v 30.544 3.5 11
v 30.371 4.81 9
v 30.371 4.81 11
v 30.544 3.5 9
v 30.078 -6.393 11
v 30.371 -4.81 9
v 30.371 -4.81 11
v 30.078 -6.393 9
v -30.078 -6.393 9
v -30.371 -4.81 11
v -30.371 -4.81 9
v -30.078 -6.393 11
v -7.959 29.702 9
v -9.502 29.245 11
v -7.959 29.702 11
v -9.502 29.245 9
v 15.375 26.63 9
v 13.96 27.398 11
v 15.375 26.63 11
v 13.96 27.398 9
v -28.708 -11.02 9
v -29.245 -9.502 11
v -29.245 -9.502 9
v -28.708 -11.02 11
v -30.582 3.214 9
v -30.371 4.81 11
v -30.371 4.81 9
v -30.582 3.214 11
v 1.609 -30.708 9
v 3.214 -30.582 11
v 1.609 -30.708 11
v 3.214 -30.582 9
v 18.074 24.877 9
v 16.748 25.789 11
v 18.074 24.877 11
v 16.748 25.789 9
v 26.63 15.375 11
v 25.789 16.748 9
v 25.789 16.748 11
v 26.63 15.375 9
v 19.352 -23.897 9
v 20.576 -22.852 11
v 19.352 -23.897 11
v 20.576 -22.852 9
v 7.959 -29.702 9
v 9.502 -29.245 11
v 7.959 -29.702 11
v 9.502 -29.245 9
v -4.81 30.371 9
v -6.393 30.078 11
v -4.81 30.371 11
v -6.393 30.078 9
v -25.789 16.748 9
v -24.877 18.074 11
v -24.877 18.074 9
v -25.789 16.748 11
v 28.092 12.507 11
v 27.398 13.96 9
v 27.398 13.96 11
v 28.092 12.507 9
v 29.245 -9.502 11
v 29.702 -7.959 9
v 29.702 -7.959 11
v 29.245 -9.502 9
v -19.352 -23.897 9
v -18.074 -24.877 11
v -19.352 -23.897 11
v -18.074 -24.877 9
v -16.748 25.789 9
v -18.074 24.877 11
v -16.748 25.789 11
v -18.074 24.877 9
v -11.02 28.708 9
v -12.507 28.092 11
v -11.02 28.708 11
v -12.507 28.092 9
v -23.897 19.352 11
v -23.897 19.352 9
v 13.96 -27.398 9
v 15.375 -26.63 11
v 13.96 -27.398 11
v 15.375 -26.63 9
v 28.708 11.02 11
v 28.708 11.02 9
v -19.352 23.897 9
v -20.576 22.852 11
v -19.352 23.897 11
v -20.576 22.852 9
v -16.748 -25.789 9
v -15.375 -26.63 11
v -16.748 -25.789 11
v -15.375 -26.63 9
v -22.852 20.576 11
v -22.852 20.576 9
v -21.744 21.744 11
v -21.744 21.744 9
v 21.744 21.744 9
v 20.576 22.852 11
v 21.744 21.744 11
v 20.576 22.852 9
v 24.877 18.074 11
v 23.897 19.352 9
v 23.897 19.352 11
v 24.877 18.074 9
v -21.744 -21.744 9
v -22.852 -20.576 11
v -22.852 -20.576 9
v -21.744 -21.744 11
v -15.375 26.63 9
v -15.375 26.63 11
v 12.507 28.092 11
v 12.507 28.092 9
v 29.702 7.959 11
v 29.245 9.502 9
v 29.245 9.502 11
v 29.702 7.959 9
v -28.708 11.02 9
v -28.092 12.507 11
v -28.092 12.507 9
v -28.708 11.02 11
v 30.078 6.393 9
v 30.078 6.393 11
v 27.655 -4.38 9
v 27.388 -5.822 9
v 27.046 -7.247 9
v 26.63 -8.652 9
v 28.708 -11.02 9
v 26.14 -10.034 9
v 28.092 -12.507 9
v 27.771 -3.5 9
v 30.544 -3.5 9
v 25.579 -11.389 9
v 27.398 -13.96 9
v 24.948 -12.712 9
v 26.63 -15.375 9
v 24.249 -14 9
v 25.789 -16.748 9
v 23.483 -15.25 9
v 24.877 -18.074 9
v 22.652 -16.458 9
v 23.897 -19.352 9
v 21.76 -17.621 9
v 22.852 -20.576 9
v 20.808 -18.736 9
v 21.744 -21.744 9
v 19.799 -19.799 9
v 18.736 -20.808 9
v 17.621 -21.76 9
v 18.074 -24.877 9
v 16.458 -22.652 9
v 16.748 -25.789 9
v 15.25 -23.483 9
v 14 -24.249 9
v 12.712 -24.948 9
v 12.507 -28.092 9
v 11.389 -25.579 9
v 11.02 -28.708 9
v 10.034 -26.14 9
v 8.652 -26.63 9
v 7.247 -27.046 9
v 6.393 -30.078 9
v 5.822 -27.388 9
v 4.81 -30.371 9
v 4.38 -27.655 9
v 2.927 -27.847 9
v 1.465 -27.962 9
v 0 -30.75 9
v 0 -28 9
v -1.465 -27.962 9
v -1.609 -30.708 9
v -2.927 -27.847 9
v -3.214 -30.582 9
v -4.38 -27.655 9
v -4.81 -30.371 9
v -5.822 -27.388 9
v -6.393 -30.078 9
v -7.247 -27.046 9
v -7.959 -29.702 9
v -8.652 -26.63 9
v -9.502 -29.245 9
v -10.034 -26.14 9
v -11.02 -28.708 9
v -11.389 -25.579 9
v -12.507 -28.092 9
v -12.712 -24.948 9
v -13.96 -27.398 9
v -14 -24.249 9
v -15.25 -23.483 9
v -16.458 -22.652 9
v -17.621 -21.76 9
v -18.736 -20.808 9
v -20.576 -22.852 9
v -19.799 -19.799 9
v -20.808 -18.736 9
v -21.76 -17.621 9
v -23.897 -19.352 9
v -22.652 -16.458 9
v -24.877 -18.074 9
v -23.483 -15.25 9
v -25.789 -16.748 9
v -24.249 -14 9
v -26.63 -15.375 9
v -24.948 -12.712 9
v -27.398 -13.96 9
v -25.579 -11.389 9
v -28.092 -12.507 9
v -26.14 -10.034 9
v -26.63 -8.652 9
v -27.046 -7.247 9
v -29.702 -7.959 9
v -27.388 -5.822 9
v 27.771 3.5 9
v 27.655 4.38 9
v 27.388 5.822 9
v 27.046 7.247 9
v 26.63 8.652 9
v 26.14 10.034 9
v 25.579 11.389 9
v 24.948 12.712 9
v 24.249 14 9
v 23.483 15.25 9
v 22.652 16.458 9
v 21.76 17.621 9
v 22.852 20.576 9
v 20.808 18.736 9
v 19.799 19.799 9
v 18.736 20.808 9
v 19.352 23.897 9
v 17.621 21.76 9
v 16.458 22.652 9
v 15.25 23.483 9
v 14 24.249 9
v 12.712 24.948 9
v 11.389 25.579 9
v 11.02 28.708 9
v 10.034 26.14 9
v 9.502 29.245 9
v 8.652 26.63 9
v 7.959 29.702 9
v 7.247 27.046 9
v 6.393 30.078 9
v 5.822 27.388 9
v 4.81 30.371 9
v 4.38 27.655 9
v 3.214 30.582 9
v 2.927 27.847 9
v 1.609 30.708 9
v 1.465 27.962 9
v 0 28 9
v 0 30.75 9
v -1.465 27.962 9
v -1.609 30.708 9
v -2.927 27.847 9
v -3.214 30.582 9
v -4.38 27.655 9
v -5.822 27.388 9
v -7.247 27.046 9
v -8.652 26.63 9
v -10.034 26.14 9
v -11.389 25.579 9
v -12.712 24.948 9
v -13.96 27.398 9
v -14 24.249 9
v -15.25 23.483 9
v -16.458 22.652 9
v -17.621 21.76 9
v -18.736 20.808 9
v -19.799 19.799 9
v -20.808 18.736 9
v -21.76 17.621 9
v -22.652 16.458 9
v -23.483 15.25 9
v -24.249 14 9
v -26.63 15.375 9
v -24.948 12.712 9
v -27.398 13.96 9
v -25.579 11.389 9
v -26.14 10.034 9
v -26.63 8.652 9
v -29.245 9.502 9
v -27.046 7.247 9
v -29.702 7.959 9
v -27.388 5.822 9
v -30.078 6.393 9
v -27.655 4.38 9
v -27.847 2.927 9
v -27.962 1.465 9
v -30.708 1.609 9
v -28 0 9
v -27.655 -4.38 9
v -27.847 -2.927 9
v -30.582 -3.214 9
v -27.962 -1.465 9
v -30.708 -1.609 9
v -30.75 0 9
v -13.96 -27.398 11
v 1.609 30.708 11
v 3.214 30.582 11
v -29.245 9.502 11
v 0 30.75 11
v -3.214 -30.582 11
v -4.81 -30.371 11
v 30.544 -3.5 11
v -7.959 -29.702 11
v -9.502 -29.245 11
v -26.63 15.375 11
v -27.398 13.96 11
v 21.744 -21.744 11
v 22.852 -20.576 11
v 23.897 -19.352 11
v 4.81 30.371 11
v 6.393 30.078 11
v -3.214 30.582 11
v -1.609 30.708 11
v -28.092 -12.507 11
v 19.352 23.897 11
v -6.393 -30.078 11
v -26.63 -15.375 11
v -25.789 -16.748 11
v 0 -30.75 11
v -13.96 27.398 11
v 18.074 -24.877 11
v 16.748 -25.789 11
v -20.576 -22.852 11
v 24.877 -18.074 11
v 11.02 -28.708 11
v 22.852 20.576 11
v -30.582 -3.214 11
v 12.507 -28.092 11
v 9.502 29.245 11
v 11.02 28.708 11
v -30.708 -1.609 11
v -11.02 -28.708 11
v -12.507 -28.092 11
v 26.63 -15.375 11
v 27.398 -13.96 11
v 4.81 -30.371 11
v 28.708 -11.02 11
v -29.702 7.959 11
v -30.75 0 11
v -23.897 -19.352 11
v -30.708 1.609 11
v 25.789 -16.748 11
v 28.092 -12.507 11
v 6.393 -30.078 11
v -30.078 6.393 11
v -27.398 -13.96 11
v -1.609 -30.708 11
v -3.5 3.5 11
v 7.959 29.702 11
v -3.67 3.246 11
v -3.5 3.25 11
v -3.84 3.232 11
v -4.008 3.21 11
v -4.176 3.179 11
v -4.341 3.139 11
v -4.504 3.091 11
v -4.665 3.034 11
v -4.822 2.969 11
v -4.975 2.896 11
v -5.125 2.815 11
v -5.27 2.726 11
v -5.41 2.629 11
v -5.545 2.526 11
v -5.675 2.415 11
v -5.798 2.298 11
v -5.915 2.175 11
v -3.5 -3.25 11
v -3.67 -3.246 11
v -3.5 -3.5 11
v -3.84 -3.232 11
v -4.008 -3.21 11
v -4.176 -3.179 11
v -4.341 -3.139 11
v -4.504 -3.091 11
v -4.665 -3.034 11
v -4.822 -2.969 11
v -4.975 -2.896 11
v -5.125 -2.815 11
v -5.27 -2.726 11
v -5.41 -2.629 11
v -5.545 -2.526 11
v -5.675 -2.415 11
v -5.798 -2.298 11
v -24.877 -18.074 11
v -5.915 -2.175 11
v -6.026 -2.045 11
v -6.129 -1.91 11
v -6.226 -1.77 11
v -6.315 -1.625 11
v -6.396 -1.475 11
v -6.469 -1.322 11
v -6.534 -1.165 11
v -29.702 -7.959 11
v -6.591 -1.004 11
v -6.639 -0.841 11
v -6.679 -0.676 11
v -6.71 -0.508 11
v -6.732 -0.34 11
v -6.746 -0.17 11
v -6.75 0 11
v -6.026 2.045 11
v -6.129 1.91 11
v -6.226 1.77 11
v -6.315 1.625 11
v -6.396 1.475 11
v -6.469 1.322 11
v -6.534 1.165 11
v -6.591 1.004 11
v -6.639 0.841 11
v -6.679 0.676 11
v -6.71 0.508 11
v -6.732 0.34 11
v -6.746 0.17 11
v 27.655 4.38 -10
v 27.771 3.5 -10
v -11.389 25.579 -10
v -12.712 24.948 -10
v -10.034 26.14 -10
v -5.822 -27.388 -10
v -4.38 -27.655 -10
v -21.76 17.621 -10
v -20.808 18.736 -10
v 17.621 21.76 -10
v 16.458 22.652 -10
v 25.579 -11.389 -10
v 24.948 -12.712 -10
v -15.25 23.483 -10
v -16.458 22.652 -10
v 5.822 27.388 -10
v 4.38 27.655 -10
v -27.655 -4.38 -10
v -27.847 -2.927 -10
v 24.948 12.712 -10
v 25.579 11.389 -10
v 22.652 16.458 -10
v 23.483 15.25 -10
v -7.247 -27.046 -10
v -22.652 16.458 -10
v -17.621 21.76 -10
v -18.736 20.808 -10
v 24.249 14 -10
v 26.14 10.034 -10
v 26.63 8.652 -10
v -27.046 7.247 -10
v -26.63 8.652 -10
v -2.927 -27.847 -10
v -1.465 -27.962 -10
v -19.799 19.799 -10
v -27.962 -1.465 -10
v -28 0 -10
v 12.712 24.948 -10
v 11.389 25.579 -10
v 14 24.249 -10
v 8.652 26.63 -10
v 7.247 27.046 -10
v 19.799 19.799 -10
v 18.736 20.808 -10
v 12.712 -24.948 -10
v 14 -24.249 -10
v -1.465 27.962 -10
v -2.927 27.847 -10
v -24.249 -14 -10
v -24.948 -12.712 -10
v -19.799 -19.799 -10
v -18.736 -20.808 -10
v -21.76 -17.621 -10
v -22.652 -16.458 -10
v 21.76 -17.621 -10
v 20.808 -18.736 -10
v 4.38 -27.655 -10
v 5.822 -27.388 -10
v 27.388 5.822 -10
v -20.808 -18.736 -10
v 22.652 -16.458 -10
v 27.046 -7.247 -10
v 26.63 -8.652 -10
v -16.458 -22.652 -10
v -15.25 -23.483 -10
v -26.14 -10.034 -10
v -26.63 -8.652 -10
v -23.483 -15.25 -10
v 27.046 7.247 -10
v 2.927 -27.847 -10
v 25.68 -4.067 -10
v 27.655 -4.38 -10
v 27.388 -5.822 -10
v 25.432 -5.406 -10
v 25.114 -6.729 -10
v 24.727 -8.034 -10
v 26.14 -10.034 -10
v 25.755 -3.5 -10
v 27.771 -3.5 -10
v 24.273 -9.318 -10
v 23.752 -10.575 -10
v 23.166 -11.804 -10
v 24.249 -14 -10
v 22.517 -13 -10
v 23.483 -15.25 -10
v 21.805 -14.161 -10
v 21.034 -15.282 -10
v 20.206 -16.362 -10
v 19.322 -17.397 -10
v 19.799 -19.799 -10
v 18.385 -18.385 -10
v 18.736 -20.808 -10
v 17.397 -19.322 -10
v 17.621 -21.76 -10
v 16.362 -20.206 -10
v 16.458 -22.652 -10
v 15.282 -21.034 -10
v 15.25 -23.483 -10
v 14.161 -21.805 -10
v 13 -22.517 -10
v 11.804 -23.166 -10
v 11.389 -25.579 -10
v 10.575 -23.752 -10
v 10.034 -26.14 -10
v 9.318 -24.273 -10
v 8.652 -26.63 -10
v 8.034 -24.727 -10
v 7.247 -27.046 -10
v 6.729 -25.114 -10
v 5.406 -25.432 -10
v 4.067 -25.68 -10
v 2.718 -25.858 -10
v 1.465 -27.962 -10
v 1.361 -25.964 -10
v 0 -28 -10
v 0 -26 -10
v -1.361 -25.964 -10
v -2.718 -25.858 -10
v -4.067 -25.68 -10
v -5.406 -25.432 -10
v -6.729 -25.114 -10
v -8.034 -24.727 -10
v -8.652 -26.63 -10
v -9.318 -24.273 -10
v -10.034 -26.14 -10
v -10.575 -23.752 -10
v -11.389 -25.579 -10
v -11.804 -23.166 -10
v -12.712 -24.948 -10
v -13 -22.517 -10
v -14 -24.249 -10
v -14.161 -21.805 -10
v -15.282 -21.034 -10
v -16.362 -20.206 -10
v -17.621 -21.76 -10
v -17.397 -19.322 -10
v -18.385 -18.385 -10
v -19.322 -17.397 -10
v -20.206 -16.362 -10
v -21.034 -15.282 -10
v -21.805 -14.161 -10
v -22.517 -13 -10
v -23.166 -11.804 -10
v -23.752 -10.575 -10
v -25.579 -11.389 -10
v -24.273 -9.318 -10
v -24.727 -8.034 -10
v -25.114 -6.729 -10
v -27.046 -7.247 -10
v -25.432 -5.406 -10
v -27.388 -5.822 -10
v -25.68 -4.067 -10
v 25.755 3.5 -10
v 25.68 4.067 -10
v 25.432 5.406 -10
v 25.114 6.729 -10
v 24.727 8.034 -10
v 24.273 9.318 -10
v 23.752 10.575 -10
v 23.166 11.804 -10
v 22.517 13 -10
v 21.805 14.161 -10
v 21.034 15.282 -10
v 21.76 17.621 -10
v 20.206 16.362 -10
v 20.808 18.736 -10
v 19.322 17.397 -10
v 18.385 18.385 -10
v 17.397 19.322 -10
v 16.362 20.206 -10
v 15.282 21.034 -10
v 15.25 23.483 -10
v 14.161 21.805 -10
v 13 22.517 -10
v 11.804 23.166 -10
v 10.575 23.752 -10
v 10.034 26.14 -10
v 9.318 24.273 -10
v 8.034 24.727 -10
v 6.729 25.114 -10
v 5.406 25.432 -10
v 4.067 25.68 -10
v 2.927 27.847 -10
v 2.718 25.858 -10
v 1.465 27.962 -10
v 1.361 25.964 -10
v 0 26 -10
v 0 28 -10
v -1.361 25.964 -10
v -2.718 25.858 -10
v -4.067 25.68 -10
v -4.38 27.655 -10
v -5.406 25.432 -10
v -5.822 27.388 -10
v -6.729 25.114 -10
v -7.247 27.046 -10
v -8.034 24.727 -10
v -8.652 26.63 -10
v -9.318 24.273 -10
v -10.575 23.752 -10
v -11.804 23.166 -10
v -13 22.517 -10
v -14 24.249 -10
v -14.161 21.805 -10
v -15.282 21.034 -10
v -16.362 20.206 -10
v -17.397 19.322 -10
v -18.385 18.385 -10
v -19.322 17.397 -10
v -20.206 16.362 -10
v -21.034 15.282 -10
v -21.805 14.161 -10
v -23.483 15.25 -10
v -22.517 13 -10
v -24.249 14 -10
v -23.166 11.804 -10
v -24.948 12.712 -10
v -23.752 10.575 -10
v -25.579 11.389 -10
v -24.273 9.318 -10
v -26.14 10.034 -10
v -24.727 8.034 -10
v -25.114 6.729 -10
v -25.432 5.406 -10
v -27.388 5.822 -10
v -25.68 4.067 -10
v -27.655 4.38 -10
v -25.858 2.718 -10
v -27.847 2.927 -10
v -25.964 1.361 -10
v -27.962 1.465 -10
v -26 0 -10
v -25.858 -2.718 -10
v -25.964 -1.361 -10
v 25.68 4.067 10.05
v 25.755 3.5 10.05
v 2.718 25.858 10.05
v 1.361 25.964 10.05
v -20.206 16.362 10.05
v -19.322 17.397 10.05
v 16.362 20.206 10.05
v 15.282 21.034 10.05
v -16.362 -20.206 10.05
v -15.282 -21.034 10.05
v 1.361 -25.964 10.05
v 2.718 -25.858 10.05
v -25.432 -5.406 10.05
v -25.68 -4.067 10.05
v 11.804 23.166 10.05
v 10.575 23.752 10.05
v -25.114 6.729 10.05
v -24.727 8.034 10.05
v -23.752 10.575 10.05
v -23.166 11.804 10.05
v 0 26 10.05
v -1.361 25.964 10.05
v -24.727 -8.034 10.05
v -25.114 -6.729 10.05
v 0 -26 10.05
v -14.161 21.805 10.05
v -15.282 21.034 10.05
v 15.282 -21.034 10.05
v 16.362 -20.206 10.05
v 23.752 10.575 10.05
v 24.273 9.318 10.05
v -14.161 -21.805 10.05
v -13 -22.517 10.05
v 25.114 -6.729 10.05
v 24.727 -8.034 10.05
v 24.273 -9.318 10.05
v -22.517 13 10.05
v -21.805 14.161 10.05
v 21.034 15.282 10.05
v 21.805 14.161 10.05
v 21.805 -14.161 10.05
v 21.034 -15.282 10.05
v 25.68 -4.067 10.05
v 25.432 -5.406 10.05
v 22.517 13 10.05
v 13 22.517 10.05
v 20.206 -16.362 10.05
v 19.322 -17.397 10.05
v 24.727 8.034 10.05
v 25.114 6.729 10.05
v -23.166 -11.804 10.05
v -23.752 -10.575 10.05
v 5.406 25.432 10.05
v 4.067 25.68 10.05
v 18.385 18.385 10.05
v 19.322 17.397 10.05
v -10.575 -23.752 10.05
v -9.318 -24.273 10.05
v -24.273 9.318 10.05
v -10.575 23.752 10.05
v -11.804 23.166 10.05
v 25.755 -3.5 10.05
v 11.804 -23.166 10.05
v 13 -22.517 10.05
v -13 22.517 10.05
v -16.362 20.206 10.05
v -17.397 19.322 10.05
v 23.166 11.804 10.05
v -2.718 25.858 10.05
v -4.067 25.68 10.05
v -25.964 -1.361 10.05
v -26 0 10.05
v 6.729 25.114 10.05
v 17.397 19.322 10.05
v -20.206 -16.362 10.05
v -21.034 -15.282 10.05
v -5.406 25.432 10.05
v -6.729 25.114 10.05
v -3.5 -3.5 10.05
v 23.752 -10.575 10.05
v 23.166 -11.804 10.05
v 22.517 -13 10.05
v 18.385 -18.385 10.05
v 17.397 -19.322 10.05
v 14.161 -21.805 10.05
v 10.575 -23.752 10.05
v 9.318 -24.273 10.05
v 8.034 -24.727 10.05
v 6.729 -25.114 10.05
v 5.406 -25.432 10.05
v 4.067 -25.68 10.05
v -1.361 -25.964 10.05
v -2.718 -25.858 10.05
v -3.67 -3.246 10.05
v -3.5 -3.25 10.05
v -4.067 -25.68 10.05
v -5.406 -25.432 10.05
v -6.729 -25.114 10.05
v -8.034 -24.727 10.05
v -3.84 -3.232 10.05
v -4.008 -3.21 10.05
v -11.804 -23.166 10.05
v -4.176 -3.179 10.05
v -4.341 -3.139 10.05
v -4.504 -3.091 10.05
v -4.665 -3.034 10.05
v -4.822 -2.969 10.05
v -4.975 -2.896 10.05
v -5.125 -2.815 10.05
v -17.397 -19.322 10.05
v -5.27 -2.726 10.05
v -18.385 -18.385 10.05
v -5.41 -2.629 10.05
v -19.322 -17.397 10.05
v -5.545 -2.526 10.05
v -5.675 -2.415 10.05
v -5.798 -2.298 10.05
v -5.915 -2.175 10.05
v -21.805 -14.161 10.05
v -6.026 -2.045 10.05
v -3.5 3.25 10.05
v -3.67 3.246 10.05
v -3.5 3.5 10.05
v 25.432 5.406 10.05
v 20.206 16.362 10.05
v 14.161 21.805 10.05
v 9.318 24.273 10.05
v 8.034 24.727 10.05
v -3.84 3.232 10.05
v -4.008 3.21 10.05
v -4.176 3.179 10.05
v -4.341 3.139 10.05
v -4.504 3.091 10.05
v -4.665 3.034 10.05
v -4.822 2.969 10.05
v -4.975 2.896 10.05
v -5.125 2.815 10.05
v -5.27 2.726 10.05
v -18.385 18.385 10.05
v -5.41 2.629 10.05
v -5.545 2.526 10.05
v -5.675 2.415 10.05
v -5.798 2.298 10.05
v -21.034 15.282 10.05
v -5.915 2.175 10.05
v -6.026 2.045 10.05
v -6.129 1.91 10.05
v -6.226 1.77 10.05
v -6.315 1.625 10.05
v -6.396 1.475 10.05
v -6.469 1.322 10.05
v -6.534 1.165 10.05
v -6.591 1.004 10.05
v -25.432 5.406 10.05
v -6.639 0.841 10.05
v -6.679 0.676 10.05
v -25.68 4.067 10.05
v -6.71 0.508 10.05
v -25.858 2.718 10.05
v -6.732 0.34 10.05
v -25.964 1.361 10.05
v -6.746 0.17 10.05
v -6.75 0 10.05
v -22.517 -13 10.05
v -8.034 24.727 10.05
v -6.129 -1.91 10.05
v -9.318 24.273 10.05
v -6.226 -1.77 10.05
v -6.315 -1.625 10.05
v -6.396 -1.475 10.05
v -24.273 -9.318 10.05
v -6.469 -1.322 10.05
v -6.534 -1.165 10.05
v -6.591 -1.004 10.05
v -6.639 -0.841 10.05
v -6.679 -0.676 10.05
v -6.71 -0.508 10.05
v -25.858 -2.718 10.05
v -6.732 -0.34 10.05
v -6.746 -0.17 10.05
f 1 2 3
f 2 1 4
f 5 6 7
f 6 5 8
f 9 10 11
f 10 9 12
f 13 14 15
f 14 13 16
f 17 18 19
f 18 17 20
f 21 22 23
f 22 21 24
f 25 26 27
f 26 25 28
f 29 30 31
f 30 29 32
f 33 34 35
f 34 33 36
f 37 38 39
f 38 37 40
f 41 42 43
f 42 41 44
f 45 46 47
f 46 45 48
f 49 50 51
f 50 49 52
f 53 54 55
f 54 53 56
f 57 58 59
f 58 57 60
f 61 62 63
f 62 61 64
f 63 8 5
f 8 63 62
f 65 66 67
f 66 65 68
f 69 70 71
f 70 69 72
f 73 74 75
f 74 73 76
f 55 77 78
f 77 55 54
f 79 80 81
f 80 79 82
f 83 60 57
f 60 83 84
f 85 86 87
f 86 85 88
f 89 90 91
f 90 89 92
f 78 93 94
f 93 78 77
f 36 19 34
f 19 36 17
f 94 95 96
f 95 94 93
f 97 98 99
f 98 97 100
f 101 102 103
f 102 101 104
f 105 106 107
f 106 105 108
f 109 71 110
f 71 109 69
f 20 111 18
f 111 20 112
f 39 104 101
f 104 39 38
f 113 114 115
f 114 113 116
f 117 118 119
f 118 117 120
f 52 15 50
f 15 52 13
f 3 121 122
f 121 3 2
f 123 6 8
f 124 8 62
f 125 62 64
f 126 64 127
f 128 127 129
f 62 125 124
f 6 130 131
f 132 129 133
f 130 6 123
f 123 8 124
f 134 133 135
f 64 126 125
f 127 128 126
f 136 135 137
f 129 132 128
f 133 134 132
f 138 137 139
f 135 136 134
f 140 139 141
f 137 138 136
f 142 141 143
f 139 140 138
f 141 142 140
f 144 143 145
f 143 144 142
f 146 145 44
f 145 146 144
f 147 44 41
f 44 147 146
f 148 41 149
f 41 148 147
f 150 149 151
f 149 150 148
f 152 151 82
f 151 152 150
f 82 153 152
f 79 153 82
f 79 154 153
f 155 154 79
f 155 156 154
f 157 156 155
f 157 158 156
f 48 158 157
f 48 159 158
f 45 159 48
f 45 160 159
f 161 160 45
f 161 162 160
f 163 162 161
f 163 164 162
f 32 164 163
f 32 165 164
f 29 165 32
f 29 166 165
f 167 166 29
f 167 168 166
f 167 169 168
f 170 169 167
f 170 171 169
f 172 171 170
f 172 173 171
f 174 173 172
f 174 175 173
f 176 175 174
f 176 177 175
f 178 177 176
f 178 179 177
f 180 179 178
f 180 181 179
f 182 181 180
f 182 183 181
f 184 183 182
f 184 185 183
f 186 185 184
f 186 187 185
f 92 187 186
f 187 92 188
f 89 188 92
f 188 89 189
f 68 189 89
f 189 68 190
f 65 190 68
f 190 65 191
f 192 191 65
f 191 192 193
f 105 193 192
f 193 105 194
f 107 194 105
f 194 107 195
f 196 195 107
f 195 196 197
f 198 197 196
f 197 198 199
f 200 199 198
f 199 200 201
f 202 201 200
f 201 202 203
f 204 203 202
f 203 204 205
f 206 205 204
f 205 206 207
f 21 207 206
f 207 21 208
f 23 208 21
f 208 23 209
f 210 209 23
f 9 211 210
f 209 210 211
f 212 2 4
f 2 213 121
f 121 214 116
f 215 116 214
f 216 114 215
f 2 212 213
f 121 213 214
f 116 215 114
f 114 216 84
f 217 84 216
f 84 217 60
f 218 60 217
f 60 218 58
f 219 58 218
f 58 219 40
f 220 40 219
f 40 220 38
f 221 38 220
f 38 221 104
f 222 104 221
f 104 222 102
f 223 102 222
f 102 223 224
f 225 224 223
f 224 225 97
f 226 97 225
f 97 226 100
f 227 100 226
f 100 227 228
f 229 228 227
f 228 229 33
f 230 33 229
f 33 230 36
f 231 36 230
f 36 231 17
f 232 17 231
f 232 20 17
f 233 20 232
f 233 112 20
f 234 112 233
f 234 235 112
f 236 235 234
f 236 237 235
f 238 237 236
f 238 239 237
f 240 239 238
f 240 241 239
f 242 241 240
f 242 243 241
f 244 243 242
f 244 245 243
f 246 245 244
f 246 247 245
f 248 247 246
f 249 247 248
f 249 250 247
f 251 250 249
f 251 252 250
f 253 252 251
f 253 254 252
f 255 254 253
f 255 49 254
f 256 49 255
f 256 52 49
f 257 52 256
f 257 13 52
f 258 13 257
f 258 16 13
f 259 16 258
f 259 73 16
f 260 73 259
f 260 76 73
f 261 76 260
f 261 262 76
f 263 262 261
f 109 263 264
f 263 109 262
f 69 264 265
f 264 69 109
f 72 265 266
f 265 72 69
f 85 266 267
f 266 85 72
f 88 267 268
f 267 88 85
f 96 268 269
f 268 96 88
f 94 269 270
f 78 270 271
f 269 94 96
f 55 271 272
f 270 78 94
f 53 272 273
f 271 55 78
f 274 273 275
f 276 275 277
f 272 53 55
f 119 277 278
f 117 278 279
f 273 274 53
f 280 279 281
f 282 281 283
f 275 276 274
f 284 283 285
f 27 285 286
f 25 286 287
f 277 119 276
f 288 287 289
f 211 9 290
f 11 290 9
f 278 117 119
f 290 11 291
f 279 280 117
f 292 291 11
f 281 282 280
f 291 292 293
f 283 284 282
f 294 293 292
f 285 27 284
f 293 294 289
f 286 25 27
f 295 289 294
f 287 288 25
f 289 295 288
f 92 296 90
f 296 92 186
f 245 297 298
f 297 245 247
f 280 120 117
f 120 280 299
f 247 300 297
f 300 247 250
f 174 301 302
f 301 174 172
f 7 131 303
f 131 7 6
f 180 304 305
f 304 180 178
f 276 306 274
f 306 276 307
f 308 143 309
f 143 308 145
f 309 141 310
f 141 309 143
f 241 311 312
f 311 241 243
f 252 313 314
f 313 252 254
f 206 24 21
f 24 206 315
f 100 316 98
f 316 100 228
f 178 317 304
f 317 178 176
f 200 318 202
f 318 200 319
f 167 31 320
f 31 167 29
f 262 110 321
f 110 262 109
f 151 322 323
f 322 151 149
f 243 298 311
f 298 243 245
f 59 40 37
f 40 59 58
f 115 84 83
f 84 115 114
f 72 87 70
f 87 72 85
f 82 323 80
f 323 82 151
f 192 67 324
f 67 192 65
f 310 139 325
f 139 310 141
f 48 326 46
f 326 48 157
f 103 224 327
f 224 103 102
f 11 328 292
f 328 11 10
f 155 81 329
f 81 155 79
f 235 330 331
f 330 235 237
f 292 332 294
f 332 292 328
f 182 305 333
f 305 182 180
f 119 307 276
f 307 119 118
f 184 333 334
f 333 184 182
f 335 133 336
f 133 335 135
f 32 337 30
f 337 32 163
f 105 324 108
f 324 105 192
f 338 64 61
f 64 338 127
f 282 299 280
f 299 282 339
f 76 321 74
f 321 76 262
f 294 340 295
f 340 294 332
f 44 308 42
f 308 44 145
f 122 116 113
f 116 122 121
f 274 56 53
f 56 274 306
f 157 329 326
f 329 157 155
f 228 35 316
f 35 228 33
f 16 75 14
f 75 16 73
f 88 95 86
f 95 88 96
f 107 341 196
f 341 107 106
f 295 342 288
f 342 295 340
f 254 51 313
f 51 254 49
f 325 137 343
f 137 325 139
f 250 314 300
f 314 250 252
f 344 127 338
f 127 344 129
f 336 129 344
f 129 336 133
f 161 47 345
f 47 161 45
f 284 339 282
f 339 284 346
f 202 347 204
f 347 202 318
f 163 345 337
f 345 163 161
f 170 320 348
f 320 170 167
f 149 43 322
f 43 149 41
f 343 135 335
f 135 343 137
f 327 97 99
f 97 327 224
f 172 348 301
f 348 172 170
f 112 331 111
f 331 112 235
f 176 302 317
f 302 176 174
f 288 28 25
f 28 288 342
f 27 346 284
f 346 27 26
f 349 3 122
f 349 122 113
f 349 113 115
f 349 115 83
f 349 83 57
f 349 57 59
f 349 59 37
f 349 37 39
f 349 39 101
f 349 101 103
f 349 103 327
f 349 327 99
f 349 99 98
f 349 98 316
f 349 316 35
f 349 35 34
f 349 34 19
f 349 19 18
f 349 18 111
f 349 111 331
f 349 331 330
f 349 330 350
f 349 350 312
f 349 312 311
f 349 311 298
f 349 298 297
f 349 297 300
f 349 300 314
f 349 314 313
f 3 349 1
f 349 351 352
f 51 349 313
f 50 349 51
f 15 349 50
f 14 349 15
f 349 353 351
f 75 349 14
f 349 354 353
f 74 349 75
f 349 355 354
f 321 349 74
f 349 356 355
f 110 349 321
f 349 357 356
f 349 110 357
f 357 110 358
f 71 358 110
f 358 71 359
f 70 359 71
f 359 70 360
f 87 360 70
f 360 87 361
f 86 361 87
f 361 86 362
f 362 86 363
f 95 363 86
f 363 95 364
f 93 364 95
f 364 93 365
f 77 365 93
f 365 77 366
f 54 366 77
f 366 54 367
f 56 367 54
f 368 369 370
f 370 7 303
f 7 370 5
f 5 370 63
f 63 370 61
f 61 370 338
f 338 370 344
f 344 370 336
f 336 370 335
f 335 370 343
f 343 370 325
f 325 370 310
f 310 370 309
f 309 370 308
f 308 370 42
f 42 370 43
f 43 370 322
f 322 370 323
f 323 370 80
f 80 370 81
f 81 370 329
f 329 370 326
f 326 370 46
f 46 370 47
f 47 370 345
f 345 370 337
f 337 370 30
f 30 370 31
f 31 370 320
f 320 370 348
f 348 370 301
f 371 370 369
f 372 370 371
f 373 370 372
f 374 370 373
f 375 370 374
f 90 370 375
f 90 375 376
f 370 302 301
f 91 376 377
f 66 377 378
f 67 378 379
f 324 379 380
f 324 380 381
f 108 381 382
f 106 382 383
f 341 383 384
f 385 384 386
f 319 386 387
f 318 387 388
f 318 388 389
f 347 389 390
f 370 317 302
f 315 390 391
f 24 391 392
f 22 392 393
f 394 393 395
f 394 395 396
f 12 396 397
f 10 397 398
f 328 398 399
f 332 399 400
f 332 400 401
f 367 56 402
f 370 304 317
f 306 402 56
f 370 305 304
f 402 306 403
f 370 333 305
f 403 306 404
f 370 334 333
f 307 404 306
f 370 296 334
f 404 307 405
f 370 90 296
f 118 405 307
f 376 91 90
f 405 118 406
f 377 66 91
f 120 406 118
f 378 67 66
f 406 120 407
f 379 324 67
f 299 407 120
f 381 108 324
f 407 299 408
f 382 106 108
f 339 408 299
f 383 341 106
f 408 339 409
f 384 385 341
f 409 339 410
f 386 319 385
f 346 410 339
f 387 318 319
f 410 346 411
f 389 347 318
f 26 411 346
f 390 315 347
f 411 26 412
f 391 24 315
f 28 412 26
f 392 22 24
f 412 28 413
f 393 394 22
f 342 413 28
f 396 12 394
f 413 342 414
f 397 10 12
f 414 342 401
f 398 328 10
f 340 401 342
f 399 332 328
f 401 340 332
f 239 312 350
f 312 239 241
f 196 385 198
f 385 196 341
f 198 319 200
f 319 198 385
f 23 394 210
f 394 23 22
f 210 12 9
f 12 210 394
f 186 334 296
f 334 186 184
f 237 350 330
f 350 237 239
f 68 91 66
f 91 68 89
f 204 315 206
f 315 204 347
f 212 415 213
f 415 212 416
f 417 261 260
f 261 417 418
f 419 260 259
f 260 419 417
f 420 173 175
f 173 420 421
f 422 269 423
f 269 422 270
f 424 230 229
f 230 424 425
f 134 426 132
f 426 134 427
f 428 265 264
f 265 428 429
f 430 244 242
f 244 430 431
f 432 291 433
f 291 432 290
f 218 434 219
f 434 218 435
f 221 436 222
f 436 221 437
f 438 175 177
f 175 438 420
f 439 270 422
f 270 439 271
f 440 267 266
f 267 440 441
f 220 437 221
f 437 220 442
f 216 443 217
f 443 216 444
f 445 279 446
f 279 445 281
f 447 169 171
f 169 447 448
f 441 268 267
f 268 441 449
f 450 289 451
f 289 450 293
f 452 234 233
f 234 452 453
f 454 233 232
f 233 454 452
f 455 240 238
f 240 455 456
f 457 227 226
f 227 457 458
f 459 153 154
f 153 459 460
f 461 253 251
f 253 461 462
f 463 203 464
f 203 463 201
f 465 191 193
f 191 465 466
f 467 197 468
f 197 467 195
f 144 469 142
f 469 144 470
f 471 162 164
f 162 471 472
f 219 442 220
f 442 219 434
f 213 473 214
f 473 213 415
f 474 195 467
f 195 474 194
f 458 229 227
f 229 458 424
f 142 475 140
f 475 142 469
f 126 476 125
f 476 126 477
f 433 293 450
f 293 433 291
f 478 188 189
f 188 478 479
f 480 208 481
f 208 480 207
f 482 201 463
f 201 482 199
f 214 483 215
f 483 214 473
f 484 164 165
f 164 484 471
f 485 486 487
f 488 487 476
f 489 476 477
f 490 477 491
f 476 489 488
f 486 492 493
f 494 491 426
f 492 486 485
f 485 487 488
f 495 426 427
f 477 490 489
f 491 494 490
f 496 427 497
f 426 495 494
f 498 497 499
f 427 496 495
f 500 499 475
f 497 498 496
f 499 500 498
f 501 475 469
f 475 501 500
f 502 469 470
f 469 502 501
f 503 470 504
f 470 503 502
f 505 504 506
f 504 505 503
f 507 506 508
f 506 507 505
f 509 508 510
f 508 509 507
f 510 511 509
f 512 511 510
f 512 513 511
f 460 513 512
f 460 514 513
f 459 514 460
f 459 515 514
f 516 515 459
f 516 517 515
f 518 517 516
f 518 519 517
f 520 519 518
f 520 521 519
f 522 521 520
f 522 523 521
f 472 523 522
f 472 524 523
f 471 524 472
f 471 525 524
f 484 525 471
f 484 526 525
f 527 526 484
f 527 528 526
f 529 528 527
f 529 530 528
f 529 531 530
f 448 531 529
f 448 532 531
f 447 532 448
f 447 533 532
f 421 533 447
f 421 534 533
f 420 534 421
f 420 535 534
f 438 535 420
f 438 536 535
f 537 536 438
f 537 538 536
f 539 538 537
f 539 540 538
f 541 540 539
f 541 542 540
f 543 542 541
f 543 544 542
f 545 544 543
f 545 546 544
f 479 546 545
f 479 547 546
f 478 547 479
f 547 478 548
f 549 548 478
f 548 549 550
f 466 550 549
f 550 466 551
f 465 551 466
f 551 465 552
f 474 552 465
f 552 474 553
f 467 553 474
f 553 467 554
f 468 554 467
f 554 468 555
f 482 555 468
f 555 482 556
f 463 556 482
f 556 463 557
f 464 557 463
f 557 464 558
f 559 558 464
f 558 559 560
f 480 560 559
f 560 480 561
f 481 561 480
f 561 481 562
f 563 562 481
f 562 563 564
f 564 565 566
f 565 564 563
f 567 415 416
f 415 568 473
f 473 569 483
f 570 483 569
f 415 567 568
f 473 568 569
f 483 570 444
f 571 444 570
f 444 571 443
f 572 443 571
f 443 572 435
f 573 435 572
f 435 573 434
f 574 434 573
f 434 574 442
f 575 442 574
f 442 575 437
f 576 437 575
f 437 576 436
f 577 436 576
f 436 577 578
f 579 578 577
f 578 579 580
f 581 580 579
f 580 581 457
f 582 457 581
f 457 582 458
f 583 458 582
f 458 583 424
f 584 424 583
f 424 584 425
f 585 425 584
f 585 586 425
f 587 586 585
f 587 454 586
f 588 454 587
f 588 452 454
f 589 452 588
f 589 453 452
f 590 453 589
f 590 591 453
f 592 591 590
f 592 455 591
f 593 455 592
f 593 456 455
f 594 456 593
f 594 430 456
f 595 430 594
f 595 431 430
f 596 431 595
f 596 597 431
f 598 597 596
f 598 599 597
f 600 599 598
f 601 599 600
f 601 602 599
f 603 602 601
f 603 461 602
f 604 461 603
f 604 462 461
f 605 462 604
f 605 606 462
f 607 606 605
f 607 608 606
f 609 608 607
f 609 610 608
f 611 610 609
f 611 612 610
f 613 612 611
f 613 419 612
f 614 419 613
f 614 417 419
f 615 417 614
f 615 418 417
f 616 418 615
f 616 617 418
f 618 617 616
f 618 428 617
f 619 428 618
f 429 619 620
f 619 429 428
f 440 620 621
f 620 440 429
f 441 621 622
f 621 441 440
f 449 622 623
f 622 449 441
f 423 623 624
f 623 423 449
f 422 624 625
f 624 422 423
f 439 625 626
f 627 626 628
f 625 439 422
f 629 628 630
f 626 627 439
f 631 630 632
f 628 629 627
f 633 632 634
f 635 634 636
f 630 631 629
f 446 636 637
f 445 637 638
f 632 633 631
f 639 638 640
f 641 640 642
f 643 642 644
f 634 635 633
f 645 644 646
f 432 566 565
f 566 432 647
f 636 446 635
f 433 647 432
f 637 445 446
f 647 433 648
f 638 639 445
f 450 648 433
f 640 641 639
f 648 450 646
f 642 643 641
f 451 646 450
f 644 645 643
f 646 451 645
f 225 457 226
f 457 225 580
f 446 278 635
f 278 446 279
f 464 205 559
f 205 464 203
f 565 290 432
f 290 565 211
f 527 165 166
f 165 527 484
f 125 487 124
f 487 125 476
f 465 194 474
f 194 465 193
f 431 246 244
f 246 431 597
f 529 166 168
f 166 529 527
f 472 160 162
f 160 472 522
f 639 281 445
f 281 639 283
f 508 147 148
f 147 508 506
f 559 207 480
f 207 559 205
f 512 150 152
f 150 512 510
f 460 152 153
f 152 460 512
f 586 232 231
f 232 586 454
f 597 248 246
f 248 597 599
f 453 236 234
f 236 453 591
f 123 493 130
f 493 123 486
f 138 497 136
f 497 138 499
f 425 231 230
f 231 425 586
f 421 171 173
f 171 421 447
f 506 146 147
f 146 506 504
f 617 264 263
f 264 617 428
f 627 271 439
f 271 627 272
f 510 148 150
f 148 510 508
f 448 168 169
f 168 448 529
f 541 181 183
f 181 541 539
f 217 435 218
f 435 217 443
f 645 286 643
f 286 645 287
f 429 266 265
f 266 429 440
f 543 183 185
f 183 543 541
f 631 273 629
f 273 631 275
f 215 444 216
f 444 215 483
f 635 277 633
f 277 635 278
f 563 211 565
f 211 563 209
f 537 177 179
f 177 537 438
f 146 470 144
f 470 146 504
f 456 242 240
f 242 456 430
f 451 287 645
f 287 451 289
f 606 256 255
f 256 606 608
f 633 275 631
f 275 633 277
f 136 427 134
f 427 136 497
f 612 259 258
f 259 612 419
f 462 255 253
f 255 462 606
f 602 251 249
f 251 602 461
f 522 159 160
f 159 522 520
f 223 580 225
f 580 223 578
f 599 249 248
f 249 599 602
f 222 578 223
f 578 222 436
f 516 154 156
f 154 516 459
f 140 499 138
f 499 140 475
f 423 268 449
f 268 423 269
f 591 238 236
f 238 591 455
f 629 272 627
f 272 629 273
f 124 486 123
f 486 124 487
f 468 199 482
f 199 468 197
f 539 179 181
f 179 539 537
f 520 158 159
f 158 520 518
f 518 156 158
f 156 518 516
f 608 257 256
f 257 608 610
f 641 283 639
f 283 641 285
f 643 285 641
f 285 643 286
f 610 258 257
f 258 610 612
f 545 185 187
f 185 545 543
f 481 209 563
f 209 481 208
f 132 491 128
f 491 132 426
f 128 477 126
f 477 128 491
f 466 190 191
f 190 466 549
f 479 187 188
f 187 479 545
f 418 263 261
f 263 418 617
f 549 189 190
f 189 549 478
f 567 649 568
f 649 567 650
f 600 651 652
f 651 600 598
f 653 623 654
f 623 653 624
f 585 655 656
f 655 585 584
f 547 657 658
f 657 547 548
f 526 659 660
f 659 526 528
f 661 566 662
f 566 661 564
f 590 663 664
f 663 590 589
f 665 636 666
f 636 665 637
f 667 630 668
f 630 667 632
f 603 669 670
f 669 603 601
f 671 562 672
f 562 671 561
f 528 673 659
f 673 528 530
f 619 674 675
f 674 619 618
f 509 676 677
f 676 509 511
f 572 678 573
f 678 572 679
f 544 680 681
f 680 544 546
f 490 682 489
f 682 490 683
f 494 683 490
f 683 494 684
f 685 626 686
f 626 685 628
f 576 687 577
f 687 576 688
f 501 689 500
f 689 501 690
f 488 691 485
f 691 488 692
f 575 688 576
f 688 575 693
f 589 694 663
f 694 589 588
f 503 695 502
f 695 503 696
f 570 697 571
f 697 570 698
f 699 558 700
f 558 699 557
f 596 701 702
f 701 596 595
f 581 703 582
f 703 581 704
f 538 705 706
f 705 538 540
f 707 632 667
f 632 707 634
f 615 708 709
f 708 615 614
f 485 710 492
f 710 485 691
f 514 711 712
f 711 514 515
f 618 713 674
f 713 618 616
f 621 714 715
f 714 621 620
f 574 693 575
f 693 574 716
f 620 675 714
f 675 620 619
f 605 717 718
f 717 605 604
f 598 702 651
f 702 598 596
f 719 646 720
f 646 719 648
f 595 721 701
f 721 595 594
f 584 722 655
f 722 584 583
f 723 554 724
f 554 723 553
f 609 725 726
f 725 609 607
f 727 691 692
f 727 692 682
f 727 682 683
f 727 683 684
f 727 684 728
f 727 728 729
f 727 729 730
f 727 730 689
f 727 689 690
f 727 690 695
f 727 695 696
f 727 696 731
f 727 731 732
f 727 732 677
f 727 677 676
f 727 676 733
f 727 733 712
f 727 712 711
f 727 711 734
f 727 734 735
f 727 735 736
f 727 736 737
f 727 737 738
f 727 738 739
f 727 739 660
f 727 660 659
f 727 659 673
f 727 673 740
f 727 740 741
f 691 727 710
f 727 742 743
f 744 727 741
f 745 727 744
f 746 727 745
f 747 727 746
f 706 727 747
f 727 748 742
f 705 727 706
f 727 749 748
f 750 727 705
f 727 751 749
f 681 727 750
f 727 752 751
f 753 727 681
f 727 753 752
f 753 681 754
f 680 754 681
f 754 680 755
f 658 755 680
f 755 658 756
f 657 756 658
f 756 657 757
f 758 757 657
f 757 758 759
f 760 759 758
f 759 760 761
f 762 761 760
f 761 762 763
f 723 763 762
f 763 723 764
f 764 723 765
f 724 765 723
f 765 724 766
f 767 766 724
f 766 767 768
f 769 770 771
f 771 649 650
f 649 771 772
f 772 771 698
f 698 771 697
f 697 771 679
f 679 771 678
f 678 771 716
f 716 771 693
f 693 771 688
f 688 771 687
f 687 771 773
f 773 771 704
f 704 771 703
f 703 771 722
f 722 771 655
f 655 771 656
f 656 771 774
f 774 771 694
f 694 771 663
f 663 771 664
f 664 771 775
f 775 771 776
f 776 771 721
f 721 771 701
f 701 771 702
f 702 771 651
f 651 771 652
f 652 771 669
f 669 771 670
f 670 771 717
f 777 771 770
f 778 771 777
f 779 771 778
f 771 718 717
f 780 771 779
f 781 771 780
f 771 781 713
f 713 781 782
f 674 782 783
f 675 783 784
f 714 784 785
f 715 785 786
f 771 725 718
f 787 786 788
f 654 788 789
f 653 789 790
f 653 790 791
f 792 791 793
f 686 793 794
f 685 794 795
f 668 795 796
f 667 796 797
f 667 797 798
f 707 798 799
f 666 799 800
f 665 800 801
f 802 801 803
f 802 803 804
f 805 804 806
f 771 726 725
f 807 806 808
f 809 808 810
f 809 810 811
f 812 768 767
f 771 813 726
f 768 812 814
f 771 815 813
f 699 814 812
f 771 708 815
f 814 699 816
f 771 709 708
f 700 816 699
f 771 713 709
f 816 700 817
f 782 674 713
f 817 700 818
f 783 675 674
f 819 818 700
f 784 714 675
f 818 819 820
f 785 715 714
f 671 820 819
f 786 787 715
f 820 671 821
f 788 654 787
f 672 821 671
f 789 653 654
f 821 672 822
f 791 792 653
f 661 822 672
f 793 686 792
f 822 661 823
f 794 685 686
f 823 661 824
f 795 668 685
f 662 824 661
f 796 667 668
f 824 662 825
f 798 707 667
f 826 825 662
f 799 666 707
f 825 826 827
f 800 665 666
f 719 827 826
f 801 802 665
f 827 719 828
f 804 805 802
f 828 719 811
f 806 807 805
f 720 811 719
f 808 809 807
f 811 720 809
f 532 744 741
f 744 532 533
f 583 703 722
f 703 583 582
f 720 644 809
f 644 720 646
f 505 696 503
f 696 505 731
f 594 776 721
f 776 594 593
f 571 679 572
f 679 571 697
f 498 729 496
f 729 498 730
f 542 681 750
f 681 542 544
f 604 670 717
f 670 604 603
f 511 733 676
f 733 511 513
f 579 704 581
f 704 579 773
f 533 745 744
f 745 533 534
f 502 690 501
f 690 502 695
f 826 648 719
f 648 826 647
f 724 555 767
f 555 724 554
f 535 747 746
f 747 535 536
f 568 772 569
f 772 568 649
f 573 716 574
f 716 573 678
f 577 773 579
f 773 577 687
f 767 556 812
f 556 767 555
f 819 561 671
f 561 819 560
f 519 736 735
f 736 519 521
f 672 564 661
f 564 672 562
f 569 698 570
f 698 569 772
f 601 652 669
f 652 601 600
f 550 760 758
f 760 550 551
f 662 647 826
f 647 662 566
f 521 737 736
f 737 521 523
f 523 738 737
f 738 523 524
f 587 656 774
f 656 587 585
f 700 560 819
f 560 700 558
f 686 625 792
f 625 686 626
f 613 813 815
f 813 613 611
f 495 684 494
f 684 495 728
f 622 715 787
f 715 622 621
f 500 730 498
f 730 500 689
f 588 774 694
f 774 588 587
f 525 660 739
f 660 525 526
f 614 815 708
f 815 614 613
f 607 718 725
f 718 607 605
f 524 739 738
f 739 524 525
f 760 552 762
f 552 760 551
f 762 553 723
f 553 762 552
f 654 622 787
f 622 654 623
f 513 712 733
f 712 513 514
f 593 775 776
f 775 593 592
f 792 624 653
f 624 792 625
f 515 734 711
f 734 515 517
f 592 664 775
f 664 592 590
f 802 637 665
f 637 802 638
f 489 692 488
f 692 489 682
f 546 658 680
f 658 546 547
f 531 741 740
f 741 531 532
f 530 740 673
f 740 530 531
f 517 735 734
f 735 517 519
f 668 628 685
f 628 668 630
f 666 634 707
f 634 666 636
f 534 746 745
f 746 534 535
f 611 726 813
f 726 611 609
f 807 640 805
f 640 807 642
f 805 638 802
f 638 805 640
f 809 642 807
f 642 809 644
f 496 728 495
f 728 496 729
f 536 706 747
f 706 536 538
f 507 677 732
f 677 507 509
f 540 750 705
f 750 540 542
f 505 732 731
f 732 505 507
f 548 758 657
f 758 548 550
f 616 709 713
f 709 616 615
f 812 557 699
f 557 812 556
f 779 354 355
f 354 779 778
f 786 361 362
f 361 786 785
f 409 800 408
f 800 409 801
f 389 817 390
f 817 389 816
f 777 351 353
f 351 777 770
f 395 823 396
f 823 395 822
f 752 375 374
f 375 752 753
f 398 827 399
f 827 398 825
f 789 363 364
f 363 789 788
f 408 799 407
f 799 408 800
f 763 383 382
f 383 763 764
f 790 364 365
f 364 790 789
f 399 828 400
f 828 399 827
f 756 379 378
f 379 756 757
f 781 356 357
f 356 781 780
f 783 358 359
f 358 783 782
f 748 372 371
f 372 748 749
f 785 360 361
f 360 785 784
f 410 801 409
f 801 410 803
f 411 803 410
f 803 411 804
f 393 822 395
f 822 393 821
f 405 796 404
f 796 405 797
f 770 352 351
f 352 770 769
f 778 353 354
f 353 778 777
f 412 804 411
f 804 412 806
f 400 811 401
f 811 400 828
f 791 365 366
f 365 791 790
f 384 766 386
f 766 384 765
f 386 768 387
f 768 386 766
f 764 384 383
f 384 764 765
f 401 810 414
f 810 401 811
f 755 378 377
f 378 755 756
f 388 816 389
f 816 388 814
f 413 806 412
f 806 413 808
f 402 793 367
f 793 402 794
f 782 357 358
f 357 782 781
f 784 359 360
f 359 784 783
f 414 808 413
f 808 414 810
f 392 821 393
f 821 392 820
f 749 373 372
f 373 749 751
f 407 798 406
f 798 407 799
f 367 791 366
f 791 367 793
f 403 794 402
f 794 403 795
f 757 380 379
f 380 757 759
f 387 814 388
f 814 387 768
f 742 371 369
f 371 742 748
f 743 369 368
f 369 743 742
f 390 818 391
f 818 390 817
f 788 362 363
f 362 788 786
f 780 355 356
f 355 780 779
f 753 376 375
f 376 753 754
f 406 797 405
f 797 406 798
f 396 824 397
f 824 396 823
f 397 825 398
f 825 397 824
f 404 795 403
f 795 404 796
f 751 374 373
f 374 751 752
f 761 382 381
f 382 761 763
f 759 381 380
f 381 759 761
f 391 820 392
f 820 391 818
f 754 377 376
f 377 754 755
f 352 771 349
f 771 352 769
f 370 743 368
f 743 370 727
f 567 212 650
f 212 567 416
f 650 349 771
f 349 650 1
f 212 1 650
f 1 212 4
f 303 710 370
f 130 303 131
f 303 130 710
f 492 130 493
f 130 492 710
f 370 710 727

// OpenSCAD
$fn= 120;
R_CORE = 28.0;
H_CORE= 20.0;
module rounded_cylinder(r,h,n) {
  rotate_extrude(convexity=1) {
    offset(r=n) offset(delta=-n) square([r,h]);
    square([n,h]);
  }
}

module plug () {
    // translate([0,0,6])rounded_cylinder(r=15,h=2.1,n=1);
    translate([0,0,H_CORE / 2]) cylinder(r=R_CORE + 2.75, h=2, center=true);
    cylinder(r=R_CORE, h=H_CORE, center=true);
}

difference(){
    plug();
    cylinder(r=R_CORE -2, h=H_CORE + 0.1, center=true);
    translate([-3.5,0,0])cylinder(r=3.25, h=H_CORE * 2.0, center=true);
    translate([-3.5,-3.5,- H_CORE ])cube([40,7,H_CORE * 2.0]);
}
